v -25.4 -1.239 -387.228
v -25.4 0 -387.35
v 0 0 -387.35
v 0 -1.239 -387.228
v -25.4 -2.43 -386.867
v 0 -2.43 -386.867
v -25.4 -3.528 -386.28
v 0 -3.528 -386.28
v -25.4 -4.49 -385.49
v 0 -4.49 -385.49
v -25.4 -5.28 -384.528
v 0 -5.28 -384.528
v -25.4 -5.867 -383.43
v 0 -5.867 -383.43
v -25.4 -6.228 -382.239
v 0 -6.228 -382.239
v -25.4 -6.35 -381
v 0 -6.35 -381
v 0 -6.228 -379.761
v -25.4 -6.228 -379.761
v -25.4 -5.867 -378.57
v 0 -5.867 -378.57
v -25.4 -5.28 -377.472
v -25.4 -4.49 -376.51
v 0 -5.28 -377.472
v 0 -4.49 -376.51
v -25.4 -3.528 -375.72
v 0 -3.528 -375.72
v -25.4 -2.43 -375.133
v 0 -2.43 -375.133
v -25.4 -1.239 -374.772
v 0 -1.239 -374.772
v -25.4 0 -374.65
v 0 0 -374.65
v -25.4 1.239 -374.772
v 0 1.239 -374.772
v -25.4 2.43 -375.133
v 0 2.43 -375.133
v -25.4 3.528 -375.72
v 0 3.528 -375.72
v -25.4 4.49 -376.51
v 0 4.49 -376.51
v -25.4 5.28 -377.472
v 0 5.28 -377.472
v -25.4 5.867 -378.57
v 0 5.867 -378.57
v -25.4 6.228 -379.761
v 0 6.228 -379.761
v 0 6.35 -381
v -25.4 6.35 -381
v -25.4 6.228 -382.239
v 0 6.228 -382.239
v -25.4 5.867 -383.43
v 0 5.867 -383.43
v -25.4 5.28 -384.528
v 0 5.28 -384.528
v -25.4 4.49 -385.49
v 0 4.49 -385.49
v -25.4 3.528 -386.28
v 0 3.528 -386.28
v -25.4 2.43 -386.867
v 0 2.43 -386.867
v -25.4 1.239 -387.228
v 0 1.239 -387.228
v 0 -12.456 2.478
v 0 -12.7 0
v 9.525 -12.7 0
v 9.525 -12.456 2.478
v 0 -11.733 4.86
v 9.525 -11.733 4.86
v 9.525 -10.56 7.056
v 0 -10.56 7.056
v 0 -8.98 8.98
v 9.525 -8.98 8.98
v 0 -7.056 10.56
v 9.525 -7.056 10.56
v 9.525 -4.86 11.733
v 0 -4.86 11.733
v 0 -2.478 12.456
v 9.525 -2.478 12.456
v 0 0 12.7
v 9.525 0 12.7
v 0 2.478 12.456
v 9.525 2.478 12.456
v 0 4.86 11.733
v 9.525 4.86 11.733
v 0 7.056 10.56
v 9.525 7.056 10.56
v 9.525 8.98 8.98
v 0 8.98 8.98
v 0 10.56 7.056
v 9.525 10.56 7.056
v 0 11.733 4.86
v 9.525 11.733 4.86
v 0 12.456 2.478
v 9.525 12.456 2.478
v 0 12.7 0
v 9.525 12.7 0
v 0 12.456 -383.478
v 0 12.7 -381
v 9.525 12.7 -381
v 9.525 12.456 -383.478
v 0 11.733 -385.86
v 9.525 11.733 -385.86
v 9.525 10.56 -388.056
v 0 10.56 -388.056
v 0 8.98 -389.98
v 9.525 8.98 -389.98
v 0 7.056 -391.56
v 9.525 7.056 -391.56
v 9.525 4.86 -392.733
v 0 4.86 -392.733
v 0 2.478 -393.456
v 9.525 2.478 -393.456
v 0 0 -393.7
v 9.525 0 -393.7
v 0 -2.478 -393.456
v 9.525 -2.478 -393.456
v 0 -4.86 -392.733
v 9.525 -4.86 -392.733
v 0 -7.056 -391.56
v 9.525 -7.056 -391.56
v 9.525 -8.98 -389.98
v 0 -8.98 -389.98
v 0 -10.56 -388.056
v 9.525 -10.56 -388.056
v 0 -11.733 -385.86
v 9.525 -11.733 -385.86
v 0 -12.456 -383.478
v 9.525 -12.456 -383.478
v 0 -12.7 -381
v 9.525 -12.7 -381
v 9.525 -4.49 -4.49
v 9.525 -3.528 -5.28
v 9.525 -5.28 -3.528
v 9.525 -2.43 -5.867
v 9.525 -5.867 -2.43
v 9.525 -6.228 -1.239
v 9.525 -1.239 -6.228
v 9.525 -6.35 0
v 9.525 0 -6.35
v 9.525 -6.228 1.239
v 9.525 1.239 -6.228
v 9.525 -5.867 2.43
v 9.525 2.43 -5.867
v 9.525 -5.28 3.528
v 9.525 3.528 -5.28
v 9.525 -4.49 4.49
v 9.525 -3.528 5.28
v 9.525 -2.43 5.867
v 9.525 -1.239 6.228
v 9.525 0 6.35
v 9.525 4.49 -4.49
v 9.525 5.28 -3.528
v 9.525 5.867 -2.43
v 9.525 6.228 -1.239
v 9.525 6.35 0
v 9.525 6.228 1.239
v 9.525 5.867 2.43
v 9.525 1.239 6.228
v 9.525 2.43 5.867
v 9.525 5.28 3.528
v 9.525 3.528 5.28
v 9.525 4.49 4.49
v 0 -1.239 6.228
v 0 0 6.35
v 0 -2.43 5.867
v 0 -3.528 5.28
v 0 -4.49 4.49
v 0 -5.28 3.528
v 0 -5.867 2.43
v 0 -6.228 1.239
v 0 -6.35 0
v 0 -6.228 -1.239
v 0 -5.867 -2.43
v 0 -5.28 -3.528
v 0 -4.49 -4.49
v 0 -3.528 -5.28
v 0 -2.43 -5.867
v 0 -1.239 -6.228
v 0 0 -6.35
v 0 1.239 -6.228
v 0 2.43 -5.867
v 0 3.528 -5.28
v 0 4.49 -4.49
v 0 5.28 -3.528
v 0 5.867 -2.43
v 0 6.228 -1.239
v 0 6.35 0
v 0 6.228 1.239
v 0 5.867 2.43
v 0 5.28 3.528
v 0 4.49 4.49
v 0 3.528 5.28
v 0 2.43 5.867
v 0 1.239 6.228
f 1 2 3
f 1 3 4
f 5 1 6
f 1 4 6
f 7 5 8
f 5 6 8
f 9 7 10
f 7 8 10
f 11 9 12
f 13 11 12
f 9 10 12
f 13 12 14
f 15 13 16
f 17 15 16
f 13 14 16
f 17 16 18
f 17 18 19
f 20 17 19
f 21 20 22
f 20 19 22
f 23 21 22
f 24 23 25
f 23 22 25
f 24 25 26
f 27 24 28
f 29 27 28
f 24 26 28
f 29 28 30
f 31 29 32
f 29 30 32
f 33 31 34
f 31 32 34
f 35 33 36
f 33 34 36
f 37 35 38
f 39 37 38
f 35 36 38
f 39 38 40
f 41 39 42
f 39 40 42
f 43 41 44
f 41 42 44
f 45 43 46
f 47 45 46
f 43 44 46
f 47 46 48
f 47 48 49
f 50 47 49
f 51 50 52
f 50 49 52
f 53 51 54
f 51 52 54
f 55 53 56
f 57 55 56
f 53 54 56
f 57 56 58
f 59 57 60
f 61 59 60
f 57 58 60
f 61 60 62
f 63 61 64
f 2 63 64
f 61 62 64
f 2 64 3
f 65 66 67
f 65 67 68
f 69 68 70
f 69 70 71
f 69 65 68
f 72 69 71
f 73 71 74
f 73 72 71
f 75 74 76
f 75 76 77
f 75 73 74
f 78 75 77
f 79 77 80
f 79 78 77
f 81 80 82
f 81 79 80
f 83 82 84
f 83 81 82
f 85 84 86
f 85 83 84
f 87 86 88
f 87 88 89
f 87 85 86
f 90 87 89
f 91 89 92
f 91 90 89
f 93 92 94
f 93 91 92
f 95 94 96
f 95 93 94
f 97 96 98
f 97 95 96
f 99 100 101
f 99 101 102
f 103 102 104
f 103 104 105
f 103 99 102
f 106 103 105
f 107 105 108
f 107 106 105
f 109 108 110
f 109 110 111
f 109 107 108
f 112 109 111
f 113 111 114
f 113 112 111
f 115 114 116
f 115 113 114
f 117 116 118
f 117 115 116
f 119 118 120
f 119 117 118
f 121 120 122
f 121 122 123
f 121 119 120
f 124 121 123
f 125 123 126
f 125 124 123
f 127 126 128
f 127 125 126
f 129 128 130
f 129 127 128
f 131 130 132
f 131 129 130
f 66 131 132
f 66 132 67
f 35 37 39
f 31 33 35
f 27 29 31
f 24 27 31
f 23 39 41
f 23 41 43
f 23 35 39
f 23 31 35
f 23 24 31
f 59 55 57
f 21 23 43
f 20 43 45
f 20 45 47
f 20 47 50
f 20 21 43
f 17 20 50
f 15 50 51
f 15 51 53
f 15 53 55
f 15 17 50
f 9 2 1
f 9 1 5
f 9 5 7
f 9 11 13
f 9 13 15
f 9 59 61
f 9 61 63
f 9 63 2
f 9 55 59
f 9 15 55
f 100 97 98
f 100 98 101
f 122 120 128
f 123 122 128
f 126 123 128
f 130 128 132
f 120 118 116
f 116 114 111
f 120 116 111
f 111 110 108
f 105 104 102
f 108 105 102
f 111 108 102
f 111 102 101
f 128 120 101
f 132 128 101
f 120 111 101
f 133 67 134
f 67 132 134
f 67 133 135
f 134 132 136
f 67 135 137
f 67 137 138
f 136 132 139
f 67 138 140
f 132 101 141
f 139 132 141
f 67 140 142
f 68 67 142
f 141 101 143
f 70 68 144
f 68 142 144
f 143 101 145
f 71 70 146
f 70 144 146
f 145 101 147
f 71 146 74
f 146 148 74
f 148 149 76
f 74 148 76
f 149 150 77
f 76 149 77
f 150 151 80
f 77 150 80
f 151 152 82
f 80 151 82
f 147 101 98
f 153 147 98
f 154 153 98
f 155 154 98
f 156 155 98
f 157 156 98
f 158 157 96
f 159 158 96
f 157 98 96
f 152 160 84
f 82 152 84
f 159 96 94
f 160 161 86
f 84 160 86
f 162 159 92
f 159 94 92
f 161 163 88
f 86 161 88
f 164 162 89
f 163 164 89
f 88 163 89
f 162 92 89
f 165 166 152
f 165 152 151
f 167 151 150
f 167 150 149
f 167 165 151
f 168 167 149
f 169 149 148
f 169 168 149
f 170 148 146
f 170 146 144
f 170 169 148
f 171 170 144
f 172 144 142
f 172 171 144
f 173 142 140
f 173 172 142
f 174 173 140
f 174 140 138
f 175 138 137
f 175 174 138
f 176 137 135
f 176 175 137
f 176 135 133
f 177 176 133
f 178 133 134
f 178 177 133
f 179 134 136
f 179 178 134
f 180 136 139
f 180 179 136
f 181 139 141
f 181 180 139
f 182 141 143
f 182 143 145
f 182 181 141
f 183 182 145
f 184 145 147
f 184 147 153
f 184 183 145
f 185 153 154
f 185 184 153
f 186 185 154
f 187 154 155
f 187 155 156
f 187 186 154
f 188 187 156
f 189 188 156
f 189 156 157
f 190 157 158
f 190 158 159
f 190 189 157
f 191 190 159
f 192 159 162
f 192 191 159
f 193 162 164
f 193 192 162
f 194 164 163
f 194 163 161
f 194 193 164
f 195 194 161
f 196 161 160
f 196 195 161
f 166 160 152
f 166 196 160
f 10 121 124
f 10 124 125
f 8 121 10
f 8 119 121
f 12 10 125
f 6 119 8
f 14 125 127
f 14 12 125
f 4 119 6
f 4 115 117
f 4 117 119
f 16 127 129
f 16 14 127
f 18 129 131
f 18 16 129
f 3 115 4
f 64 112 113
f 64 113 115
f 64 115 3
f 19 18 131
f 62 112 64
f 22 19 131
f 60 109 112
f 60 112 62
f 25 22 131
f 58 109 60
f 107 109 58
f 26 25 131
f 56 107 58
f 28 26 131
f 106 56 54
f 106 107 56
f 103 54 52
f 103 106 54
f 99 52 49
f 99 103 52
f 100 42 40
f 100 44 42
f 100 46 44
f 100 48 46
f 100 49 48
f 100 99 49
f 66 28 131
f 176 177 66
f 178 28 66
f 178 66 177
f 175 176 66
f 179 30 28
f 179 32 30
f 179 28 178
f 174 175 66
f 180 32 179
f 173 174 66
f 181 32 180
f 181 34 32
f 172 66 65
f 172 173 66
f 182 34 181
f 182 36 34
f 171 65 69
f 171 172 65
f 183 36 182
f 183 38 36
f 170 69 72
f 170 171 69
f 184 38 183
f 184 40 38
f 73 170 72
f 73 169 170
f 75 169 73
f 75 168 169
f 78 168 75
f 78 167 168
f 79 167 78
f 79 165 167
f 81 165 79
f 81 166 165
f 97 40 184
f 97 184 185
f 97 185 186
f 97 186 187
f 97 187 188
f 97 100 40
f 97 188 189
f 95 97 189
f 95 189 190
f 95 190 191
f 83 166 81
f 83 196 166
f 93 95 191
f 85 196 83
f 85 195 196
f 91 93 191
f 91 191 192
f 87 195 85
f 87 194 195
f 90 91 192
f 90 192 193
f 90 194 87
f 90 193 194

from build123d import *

# Parameters (mm, degrees)
SKETCH2_R           = 6.35
BOSS_EXTRUDE1_DEPTH = 9.525
SKETCH4_R           = 6.35
BOSS_EXTRUDE3_DEPTH = 25.4


with BuildPart() as part:
    # Sketch2 → Boss-Extrude1 (new body)
    with BuildSketch(Plane(origin=(0, 0, 0), x_dir=(0, 0, -1), z_dir=(1, 0, 0))):
        with BuildLine():
            Line((0, 12.7), (381, 12.7))
            ThreePointArc((381, 12.7), (393.7, 0), (381, -12.7))
            Line((381, -12.7), (0, -12.7))
            ThreePointArc((0, -12.7), (-12.7, 0), (0, 12.7))
        make_face()
        with Locations(Location((0, 0, 0), (0, 0, 180))):
            Circle(SKETCH2_R, mode=Mode.SUBTRACT)
    extrude(amount=BOSS_EXTRUDE1_DEPTH)

    # Sketch4 → Boss-Extrude3 (add)
    with BuildSketch(Plane.ZY):
        with Locations(Location((-381, 0, 0), (0, 0, 180))):
            Circle(SKETCH4_R)
    extrude(amount=BOSS_EXTRUDE3_DEPTH)


solid = part.part
